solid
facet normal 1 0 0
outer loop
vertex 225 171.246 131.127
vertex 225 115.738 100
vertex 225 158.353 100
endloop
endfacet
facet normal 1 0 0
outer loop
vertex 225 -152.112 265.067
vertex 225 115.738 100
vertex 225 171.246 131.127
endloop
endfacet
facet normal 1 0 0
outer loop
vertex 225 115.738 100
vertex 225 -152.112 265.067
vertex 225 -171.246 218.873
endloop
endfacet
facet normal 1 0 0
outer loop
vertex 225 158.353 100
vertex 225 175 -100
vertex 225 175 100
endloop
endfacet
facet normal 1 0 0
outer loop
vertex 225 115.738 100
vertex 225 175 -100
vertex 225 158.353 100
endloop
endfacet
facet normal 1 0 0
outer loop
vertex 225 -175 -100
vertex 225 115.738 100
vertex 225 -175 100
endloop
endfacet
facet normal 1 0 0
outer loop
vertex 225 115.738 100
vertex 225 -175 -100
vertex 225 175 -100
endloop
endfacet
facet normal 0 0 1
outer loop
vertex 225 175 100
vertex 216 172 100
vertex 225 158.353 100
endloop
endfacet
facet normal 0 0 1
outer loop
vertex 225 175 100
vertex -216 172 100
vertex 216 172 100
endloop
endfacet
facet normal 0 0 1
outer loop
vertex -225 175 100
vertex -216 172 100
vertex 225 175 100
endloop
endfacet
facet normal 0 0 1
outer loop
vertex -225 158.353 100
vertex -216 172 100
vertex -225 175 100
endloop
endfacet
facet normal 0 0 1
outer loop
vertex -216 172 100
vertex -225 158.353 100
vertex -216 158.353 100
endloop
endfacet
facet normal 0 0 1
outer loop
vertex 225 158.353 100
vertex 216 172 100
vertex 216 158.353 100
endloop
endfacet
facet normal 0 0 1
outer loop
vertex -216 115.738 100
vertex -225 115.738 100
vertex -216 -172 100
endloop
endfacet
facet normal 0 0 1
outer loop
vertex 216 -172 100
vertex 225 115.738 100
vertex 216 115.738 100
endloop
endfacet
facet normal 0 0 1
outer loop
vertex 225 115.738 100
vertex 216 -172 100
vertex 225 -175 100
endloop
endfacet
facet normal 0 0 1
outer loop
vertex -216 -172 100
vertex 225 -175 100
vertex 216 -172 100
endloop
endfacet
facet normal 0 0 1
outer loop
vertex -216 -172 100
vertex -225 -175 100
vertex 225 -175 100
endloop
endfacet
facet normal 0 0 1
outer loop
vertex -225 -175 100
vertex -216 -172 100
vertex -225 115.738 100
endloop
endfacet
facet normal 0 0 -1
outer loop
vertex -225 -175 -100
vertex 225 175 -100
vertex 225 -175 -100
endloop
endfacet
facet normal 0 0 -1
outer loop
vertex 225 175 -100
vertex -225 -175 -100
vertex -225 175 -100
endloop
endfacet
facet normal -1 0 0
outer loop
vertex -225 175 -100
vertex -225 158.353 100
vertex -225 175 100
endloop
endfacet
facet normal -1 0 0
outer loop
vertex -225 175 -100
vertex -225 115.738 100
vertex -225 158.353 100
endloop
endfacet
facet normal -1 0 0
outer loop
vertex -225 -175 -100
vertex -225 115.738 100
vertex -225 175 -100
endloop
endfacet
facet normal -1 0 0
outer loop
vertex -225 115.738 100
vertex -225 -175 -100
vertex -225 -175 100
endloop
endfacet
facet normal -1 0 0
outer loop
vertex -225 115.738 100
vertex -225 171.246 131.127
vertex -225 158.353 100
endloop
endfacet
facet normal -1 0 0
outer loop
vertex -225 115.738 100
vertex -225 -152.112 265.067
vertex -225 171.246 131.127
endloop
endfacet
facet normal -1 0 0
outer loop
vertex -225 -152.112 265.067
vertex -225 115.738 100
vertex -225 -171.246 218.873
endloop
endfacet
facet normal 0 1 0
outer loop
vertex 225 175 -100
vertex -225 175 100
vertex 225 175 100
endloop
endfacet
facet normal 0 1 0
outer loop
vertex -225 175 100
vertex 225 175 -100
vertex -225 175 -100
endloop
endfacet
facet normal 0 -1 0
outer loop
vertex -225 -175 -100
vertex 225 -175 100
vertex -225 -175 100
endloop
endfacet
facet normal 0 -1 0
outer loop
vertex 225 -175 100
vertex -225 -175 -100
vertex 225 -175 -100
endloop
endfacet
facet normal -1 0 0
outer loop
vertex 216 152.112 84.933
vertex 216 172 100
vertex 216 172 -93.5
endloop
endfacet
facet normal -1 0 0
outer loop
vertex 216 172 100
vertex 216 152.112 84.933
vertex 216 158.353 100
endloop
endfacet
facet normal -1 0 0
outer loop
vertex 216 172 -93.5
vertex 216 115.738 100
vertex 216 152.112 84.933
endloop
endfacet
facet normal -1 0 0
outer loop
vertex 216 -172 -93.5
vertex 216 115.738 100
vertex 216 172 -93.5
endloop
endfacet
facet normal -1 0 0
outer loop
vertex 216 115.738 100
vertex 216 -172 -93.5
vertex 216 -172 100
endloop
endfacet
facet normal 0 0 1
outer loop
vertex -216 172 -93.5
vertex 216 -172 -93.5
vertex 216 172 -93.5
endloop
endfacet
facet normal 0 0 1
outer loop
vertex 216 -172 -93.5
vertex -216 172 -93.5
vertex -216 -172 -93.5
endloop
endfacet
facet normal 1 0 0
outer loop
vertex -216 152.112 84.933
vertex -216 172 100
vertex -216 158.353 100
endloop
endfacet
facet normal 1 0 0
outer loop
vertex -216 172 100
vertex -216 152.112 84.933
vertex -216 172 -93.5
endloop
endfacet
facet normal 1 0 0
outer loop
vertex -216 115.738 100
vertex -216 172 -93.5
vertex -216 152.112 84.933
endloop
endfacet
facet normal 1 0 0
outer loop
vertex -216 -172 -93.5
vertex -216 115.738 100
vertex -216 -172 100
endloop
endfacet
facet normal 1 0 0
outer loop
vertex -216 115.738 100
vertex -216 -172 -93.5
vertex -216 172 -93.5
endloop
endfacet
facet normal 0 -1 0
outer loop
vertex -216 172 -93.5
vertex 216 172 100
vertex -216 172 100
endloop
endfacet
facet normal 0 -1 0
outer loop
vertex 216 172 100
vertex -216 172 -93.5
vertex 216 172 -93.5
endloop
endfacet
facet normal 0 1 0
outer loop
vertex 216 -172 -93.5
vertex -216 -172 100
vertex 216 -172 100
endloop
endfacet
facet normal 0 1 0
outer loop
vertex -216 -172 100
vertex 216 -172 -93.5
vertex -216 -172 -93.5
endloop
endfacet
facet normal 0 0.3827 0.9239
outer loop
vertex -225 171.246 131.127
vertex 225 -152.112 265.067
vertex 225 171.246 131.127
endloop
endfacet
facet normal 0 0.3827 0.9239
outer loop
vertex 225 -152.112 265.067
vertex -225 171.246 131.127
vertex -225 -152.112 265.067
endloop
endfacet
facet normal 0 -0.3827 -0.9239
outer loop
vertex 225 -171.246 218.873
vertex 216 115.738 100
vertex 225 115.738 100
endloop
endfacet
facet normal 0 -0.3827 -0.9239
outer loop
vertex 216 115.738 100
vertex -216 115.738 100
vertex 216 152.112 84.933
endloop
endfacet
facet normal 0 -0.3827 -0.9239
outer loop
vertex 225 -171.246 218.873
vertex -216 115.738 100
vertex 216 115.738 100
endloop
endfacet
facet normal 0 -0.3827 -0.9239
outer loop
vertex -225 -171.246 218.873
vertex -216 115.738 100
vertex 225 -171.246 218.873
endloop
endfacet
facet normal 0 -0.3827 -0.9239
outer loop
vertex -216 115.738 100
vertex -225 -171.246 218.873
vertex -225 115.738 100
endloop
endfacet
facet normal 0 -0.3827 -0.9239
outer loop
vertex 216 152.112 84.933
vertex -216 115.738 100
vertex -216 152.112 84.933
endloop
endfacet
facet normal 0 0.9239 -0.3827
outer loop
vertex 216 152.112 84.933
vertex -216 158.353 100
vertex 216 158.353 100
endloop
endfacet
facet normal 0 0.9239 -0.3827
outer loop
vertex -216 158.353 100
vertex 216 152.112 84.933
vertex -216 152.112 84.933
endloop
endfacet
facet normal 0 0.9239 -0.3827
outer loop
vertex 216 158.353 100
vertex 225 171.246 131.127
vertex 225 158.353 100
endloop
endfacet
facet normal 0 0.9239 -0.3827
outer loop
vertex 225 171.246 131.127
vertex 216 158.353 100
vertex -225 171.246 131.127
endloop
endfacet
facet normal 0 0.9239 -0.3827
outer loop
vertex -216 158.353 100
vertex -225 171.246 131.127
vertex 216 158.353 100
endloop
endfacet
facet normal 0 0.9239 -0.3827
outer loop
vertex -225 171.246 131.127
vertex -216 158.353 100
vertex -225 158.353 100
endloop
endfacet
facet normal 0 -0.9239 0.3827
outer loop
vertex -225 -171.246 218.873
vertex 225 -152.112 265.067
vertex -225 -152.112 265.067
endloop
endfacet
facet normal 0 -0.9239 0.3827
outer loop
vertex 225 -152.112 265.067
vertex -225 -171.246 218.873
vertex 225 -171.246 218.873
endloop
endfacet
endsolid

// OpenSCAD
difference() {
  cube(size=[18*25, 14*25, 8*25], center=true);
  translate([0, 0, 3.5]) cube(size=[18*25 - 18, 14*25 - 6, 8*25 - 6], center=true);
}

translate([0, 0, 7*25]) rotate([-22.5, 0, 0]) cube(size=[18*25, 14*25, 2*25], center=true);
